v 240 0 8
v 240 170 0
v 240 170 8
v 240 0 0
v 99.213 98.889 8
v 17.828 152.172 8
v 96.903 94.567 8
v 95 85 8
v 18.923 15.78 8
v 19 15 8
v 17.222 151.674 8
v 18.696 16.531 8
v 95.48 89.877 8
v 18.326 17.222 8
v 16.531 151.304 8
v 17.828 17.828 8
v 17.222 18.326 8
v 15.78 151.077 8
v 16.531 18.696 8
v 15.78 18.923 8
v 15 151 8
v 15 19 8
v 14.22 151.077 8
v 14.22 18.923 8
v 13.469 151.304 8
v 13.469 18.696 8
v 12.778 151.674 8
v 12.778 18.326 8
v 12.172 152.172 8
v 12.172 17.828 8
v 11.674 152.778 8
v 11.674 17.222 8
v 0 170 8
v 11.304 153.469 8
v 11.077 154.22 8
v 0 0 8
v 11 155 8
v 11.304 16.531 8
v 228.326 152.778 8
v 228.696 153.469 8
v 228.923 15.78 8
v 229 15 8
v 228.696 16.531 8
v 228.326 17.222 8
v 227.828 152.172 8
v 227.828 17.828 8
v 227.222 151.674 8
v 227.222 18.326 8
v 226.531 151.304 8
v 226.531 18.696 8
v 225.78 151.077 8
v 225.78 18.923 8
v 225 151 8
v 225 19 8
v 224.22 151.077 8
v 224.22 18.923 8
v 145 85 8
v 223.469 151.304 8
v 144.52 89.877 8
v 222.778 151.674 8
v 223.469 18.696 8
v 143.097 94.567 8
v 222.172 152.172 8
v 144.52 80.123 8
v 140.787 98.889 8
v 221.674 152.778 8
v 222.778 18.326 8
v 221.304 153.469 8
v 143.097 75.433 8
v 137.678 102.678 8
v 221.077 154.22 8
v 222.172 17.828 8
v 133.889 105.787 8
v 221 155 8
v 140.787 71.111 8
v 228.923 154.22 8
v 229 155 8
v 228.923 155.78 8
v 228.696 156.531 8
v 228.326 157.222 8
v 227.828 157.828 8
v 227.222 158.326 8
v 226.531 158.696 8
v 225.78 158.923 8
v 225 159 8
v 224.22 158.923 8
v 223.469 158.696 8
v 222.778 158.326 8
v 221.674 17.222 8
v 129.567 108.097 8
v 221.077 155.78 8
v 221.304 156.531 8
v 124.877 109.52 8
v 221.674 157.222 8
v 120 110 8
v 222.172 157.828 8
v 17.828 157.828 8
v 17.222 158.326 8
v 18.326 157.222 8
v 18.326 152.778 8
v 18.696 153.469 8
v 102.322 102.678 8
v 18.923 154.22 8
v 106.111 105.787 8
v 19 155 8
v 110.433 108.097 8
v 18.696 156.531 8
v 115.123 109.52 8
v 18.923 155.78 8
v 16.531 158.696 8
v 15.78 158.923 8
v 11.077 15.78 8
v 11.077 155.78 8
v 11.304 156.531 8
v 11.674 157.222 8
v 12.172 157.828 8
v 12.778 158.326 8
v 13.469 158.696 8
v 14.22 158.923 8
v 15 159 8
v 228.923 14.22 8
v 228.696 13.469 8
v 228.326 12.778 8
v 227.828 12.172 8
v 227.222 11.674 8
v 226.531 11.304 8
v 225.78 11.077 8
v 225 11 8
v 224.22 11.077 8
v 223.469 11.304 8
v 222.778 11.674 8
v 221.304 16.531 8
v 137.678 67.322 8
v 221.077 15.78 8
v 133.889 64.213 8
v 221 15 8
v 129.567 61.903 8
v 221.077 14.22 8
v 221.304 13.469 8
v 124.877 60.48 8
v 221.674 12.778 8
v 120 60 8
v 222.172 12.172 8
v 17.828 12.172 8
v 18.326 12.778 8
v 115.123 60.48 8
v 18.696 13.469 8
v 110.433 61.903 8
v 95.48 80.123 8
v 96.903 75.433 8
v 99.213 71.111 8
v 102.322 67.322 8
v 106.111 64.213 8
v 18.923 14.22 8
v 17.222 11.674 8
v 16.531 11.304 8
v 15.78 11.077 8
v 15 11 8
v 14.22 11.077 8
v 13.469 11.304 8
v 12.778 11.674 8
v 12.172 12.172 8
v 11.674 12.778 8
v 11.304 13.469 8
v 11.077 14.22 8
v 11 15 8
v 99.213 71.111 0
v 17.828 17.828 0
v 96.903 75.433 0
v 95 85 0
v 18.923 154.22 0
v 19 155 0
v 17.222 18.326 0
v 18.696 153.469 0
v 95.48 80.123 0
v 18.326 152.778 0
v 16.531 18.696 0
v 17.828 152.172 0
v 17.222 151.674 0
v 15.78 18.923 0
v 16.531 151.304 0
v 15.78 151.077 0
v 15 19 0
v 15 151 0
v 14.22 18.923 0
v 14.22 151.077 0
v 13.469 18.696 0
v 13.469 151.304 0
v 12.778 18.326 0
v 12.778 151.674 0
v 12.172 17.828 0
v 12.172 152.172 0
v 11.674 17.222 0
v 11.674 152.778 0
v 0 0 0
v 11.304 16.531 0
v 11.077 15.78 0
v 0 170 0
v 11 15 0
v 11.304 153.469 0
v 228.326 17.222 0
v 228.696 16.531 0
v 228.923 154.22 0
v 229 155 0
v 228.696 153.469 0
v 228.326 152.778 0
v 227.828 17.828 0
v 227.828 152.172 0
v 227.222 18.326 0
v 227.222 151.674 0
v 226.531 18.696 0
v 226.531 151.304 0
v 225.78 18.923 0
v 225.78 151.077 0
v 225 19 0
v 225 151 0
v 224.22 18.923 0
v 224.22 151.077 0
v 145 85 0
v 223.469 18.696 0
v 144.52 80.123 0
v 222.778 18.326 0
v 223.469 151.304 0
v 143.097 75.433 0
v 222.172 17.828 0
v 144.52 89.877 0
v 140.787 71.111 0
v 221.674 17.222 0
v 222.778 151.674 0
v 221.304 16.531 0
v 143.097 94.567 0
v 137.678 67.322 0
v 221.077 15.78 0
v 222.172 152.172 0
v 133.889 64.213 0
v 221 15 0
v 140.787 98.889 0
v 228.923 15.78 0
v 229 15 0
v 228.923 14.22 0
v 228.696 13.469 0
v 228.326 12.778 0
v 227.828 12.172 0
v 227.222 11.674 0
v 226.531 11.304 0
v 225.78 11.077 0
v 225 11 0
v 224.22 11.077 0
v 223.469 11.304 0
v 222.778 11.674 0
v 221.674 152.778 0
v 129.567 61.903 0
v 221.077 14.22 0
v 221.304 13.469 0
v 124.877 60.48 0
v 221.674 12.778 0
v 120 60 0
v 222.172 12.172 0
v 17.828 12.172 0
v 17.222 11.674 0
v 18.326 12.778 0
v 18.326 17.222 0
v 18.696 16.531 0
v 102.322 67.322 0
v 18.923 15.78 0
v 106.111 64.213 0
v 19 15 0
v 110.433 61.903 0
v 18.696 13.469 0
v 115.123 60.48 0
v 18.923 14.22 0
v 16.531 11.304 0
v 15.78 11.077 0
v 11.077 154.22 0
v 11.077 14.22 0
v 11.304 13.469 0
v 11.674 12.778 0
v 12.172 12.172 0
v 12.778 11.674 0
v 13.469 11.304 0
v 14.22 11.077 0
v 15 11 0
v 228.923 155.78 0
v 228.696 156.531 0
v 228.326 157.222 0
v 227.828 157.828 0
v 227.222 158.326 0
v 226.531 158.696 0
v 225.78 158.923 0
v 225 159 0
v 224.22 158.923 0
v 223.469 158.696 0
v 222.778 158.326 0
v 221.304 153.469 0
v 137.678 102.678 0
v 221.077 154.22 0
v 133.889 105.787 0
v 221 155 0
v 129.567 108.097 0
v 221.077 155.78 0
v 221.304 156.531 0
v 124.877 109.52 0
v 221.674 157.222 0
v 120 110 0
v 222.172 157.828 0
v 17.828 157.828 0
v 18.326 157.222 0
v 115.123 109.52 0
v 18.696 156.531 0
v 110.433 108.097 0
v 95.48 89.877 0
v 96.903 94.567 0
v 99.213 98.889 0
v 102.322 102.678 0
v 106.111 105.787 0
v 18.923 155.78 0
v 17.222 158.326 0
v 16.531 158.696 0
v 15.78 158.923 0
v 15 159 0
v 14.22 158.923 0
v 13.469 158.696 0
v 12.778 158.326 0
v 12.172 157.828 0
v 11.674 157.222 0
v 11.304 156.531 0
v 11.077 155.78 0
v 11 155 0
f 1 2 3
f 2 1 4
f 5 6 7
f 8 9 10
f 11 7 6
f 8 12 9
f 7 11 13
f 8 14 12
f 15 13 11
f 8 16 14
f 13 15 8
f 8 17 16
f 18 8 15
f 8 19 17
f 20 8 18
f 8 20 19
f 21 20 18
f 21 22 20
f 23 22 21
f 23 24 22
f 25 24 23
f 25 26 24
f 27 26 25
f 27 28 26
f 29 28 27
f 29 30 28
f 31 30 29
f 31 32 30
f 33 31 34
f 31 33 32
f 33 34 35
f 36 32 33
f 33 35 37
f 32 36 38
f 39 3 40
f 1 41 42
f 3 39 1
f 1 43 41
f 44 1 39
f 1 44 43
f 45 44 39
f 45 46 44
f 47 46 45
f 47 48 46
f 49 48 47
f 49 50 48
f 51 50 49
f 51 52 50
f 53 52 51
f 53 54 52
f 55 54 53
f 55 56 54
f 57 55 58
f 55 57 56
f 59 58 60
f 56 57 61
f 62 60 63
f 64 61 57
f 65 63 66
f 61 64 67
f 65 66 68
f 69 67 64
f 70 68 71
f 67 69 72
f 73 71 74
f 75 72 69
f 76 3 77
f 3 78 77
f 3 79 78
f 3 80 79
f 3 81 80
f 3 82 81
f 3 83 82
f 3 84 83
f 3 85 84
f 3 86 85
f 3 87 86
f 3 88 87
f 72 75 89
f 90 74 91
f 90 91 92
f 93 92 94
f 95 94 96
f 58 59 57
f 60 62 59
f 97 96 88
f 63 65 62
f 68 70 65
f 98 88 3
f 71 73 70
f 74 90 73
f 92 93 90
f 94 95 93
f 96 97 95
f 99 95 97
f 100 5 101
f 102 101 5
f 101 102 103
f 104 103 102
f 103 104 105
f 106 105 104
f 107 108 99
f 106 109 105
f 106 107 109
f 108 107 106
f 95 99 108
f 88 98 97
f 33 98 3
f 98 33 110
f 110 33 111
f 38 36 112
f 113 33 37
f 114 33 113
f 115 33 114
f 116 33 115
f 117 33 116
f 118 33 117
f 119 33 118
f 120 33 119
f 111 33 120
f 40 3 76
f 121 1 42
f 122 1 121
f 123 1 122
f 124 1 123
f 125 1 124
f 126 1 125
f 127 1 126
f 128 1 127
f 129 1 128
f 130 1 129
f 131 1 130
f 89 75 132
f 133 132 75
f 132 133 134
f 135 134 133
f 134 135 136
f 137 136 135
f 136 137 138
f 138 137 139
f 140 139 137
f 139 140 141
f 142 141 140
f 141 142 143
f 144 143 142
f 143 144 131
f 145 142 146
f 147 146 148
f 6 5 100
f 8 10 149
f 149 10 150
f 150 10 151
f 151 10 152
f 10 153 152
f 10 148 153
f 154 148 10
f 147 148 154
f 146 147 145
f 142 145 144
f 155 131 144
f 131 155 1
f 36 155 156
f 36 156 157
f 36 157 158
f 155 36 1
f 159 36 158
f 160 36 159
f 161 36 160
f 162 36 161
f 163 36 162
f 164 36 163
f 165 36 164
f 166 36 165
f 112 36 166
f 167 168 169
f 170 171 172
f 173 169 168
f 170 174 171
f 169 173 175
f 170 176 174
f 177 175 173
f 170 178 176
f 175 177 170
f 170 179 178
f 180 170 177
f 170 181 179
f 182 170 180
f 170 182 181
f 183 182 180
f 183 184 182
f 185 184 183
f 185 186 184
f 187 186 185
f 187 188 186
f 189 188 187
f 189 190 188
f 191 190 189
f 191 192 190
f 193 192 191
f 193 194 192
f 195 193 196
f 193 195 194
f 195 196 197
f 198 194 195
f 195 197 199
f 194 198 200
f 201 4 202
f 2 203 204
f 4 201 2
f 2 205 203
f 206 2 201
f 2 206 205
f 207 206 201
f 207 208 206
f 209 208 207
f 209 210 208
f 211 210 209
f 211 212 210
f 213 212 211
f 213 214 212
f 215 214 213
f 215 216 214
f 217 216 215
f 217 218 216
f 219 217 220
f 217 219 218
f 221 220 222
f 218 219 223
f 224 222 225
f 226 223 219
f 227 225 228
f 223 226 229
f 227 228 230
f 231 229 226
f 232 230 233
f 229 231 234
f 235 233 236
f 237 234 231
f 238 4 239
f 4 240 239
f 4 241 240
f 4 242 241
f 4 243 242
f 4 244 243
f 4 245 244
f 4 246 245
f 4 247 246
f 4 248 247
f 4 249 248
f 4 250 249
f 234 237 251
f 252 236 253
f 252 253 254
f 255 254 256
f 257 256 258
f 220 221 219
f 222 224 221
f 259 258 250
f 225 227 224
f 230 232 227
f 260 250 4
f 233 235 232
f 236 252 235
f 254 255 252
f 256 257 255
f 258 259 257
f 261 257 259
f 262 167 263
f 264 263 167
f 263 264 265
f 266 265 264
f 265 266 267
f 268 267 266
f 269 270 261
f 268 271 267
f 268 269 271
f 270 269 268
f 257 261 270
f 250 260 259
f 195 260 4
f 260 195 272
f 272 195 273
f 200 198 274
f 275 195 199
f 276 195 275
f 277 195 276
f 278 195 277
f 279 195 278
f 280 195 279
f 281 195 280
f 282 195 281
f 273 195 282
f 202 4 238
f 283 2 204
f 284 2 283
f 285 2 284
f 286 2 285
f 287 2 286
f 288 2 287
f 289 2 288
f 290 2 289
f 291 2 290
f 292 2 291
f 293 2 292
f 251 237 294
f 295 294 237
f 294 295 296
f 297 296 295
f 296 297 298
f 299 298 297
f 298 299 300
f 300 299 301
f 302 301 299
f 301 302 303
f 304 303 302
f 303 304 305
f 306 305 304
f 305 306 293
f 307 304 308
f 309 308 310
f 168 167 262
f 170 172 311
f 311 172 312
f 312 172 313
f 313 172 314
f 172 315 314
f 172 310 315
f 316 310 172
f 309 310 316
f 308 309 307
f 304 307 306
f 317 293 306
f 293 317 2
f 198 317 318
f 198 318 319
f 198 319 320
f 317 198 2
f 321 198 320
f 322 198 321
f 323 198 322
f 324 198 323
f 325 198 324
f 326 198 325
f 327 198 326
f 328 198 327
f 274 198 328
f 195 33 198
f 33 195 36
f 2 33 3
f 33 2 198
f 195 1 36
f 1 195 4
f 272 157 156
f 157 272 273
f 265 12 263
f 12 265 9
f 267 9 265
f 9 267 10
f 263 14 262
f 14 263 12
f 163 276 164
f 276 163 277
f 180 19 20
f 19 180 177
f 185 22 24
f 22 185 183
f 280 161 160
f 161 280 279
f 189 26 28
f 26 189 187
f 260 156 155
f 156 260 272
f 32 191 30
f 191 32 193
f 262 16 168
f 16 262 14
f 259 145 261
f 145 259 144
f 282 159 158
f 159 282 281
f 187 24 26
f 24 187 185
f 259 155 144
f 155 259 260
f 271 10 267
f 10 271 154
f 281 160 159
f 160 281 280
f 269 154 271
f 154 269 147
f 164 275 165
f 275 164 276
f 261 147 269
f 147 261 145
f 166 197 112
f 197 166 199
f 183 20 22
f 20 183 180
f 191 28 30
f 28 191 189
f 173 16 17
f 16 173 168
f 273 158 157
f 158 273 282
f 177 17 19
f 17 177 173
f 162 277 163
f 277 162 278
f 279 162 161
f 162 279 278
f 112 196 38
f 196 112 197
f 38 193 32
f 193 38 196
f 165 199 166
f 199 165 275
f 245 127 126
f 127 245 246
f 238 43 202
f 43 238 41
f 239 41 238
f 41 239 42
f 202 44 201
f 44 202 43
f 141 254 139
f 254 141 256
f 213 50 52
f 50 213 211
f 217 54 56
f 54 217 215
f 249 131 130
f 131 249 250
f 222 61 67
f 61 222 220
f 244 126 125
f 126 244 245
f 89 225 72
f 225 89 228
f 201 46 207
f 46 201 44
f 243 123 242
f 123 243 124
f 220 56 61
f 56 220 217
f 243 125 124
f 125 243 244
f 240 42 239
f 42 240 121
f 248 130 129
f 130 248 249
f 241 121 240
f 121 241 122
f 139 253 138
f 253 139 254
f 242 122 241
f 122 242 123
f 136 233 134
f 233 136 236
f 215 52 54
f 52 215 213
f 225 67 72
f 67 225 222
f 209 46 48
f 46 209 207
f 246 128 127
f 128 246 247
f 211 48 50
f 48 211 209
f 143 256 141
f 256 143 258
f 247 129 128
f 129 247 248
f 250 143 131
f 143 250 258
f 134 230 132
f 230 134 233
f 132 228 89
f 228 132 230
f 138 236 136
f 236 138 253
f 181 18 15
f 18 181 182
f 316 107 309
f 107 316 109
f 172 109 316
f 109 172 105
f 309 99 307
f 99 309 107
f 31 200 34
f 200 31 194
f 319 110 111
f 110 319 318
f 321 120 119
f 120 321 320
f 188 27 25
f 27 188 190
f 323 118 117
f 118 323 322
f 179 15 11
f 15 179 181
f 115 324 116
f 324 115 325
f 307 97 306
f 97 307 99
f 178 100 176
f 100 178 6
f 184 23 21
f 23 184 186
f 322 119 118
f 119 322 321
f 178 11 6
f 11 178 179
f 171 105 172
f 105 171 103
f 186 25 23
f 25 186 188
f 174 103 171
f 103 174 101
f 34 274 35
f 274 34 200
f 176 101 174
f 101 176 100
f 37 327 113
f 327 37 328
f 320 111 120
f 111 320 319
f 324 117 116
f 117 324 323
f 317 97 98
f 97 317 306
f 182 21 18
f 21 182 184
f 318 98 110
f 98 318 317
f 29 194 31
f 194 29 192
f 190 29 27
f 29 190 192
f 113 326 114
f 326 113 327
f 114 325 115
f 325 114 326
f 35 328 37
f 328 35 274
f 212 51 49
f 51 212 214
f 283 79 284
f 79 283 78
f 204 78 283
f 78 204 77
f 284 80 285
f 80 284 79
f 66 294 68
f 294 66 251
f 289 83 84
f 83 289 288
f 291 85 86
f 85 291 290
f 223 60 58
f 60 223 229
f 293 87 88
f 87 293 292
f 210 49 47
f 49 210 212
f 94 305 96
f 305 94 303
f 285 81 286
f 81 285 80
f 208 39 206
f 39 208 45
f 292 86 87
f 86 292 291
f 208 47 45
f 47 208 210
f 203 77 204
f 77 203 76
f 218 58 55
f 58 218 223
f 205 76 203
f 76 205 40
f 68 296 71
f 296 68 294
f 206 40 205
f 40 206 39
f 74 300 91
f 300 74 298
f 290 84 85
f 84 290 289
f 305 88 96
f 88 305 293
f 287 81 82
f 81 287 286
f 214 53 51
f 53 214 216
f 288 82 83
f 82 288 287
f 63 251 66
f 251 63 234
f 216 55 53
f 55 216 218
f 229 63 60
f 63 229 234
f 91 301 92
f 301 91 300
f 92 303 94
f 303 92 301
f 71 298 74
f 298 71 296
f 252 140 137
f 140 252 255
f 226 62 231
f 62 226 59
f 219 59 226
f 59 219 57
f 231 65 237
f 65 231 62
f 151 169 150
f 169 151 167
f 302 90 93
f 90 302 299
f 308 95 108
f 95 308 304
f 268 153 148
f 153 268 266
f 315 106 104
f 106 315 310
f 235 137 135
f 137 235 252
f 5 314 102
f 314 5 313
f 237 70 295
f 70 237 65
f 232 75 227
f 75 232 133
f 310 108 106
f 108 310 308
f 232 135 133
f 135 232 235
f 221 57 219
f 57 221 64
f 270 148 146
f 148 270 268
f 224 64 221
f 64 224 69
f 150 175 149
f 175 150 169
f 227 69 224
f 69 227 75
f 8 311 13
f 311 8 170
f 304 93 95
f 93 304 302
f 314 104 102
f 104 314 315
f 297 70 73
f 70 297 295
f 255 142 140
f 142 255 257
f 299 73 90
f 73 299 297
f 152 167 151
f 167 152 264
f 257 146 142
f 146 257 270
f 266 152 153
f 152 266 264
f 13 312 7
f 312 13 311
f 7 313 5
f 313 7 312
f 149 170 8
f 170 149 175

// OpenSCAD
$fn = 32;

// ----------------------------------------------------------------------
// Big plate: 200-250 mm adapter plate
// ----------------------------------------------------------------------

// --- parameters (mm) ---
plate_l = 240;            // plate length, X
plate_w = 170;            // plate width, Y
plate_t = 8;              // plate thickness, Z
corner_d = 8;             // corner hole diameter
corner_in = 15;           // corner hole inset from the edges
bore_d = 50;              // central bore
fit_tol = 0.1;            // tolerance for press fits, mm
free_tol = 0.5;           // tolerance for clearance fits, mm

difference() {
  cube([plate_l, plate_w, plate_t]);
  translate([corner_in, corner_in, -1]) cylinder(h = plate_t + 2, d = corner_d);
  translate([plate_l - corner_in, corner_in, -1]) cylinder(h = plate_t + 2, d = corner_d);
  translate([corner_in, plate_w - corner_in, -1]) cylinder(h = plate_t + 2, d = corner_d);
  translate([plate_l - corner_in, plate_w - corner_in, -1]) cylinder(h = plate_t + 2, d = corner_d);
  translate([plate_l / 2, plate_w / 2, -1]) cylinder(h = plate_t + 2, d = bore_d);
}
